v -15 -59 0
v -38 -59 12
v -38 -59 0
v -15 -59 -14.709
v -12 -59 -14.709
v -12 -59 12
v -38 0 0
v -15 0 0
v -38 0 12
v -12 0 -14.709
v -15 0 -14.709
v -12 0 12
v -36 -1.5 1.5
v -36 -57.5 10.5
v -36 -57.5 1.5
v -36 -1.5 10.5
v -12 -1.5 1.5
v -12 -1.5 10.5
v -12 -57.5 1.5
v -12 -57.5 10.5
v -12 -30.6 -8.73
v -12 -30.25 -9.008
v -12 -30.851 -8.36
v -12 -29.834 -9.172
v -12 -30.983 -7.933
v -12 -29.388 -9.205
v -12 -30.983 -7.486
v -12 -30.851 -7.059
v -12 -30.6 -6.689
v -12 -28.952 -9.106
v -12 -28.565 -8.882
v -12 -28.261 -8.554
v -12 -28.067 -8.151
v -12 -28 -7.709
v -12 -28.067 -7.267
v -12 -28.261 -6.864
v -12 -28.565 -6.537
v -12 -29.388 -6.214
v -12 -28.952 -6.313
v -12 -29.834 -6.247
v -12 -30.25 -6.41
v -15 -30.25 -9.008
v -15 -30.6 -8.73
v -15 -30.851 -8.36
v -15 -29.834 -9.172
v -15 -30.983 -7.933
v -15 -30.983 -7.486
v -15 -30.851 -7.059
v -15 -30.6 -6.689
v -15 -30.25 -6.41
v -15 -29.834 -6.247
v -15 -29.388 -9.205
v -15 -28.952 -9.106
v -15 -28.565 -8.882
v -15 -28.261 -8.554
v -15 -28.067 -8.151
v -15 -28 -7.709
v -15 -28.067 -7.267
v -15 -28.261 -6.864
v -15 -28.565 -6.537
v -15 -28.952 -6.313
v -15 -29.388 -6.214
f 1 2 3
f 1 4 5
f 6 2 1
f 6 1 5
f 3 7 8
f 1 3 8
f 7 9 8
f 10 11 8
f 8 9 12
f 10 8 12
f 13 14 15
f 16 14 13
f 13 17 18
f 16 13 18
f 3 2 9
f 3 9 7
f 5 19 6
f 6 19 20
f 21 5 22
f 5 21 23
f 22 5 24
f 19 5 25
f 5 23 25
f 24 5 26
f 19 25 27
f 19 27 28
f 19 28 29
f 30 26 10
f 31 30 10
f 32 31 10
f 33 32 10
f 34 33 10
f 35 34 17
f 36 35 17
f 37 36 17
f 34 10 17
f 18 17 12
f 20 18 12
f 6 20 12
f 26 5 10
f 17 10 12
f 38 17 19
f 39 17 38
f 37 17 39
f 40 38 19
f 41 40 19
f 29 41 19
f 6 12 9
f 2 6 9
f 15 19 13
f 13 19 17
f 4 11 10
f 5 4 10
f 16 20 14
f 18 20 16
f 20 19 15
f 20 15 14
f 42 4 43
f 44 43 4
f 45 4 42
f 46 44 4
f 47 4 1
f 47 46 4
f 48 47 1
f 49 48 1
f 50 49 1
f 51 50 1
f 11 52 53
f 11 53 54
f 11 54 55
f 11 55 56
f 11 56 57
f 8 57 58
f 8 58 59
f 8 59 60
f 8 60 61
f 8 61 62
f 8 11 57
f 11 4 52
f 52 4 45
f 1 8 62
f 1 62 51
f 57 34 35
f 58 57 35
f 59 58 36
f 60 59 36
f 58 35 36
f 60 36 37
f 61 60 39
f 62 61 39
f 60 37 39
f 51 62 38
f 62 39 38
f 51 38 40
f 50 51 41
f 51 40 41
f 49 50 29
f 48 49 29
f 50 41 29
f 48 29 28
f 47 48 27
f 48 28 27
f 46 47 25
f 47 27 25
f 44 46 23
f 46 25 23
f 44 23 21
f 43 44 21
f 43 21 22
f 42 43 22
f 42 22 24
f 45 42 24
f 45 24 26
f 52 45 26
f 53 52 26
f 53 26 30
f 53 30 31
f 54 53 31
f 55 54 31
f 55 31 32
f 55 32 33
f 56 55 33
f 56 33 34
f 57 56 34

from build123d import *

# Parameters (mm, degrees)
F0_W     = 3
F0_H     = 14.70934
F1_DEPTH = 59
F2_R     = 1.5
F3_DEPTH = 4
F2_W     = 56
F2_H     = 9
F4_DEPTH = 24


with BuildPart() as f1:
    # F0 (on Front) → F1 (new body)
    with BuildSketch(Plane.XZ):
        Polygon((-12, 12), (-38, 12), (-38, 0), (-15, 0), (-12, 0), align=None)
        with Locations((-13.5, -7.35467)):
            Rectangle(F0_W, F0_H)
    extrude(amount=F1_DEPTH)

    # F2 (on face) → F3 (cut)
    with BuildSketch(Plane.YZ.offset(-12)):
        with Locations((-29.5, -7.70934)):
            Circle(F2_R)
    extrude(amount=-F3_DEPTH, mode=Mode.SUBTRACT)

    # F2 (on face) → F4 (cut)
    with BuildSketch(Plane.YZ.offset(-12)):
        with Locations((-29.5, 6)):
            Rectangle(F2_W, F2_H)
        with Locations((-29.5, -7.70934)):
            Circle(F2_R)
    extrude(amount=-F4_DEPTH, mode=Mode.SUBTRACT)


solid = f1.part
